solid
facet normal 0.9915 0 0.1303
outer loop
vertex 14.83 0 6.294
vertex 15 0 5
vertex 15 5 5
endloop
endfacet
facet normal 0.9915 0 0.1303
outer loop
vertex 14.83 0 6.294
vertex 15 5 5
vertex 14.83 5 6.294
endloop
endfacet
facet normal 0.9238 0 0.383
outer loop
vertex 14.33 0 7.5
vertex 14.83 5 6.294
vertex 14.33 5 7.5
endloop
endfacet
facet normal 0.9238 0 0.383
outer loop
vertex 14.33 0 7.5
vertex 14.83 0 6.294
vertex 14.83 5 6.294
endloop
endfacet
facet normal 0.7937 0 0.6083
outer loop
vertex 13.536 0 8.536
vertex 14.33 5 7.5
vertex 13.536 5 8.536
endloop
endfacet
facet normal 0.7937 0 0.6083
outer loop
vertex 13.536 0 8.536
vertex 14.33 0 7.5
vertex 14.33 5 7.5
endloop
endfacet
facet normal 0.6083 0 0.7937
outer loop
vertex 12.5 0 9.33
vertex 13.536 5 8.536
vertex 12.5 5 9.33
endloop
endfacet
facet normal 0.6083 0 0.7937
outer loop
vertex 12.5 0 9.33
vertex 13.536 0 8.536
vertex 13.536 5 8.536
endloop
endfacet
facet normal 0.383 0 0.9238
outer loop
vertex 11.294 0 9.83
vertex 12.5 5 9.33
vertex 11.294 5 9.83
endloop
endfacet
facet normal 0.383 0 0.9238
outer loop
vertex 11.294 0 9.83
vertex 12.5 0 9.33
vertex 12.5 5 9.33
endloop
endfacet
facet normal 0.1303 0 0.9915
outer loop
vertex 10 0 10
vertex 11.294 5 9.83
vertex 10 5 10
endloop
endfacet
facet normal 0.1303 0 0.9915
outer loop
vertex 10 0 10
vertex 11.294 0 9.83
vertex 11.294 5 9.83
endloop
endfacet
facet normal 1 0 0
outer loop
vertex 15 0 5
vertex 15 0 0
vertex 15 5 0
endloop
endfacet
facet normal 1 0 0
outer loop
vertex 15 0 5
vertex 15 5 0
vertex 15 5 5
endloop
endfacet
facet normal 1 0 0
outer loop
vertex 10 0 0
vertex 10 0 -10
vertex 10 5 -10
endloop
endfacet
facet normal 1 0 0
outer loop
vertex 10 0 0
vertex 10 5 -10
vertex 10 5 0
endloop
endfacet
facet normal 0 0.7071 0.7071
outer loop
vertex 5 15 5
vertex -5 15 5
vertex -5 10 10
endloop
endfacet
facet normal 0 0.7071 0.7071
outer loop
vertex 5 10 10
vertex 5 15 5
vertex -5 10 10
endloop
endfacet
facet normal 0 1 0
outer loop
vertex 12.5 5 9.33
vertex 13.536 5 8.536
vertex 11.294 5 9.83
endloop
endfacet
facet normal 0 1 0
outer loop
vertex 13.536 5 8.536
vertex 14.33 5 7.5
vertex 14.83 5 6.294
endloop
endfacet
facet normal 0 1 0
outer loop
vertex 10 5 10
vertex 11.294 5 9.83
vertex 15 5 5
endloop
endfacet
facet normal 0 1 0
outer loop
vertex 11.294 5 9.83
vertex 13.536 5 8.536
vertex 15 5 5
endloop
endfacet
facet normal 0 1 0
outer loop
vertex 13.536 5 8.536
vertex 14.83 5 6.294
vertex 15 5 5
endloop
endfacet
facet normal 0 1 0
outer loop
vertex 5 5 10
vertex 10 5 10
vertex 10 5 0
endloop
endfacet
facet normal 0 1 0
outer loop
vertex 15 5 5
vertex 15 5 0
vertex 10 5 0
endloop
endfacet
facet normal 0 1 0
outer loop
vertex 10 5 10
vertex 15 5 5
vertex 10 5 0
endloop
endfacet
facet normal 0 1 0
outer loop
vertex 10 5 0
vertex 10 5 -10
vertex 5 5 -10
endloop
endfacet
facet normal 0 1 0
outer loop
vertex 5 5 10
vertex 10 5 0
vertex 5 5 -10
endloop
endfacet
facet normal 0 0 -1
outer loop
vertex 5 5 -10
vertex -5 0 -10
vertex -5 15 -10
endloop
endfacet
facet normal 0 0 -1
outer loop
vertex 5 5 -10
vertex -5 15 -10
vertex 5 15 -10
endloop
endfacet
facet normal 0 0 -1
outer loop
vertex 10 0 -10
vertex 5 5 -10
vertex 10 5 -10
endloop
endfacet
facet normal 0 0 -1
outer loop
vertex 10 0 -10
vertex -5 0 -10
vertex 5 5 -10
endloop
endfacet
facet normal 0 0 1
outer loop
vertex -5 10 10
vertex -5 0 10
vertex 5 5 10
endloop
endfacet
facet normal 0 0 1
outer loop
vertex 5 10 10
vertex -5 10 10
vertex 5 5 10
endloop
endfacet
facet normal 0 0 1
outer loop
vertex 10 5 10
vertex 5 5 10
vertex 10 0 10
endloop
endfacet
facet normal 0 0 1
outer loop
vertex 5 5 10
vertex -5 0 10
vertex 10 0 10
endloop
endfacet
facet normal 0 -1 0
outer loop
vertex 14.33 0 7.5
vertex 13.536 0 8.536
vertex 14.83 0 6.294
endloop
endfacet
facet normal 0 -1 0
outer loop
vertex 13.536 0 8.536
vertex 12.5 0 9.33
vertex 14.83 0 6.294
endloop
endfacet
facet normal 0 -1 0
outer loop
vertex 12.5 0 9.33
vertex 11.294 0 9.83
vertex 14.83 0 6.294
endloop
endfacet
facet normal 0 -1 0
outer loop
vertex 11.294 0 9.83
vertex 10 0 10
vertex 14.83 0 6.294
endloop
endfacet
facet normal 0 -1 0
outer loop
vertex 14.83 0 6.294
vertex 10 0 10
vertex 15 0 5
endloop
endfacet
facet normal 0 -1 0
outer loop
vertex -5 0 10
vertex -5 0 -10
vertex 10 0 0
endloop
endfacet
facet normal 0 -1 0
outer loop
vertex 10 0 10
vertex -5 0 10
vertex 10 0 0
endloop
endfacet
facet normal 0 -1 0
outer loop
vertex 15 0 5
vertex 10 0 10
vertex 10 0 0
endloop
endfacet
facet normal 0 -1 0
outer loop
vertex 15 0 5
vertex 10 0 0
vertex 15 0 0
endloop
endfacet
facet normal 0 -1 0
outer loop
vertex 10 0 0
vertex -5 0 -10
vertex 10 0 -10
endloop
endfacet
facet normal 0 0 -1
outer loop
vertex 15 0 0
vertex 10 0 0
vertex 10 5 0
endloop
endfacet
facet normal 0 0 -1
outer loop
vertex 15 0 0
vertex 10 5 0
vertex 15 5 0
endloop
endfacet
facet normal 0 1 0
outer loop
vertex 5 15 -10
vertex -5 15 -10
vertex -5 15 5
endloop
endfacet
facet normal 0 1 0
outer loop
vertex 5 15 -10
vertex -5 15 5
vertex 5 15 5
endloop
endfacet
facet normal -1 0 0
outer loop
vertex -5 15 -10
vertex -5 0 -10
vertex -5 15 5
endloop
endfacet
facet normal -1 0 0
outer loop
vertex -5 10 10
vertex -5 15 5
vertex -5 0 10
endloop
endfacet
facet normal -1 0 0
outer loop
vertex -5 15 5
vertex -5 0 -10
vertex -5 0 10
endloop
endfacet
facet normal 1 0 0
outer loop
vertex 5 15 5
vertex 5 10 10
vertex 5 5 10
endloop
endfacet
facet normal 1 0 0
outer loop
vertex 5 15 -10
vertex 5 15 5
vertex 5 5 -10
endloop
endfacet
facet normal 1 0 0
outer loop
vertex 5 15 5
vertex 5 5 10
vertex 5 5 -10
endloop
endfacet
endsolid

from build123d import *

# Parameters (mm, degrees)
EXTRUDE_1_DEPTH     = 5
SKETCH_1_3_W        = 10
SKETCH_1_3_H        = 20
EXTRUDE_2_DEPTH     = 15
CUT_EXTRUDE_1_DEPTH = 15


with BuildPart() as part:
    # 草圖1 → 填料-伸長1 (new body)
    with BuildSketch(Plane(origin=(0, 0, 0), x_dir=(1, 0, 0), z_dir=(0, 1, 0))):
        with BuildLine():
            Line((10, 10), (5, 10))
            Line((5, 10), (5, -5))
            Line((5, -5), (5, -10))
            Line((5, -10), (10, -10))
            ThreePointArc((10, -10), (13.535533906, -8.535533906), (15, -5))
            Line((15, -5), (15, 0))
            Line((15, 0), (10, 0))
            Line((10, 0), (10, 10))
        make_face()
    extrude(amount=EXTRUDE_1_DEPTH)

    # 草圖1<3> → 填料-伸長2 (add)
    with BuildSketch(Plane(origin=(0, 0, 0), x_dir=(1, 0, 0), z_dir=(0, 1, 0))):
        Rectangle(SKETCH_1_3_W, SKETCH_1_3_H)
    extrude(amount=EXTRUDE_2_DEPTH)

    # 草圖2 → 除料-伸長1 (cut)
    with BuildSketch(Plane.ZY.offset(5)):
        Polygon((5, 15), (10, 10), (10, 15), align=None)
    extrude(amount=-CUT_EXTRUDE_1_DEPTH, mode=Mode.SUBTRACT)


solid = part.part
